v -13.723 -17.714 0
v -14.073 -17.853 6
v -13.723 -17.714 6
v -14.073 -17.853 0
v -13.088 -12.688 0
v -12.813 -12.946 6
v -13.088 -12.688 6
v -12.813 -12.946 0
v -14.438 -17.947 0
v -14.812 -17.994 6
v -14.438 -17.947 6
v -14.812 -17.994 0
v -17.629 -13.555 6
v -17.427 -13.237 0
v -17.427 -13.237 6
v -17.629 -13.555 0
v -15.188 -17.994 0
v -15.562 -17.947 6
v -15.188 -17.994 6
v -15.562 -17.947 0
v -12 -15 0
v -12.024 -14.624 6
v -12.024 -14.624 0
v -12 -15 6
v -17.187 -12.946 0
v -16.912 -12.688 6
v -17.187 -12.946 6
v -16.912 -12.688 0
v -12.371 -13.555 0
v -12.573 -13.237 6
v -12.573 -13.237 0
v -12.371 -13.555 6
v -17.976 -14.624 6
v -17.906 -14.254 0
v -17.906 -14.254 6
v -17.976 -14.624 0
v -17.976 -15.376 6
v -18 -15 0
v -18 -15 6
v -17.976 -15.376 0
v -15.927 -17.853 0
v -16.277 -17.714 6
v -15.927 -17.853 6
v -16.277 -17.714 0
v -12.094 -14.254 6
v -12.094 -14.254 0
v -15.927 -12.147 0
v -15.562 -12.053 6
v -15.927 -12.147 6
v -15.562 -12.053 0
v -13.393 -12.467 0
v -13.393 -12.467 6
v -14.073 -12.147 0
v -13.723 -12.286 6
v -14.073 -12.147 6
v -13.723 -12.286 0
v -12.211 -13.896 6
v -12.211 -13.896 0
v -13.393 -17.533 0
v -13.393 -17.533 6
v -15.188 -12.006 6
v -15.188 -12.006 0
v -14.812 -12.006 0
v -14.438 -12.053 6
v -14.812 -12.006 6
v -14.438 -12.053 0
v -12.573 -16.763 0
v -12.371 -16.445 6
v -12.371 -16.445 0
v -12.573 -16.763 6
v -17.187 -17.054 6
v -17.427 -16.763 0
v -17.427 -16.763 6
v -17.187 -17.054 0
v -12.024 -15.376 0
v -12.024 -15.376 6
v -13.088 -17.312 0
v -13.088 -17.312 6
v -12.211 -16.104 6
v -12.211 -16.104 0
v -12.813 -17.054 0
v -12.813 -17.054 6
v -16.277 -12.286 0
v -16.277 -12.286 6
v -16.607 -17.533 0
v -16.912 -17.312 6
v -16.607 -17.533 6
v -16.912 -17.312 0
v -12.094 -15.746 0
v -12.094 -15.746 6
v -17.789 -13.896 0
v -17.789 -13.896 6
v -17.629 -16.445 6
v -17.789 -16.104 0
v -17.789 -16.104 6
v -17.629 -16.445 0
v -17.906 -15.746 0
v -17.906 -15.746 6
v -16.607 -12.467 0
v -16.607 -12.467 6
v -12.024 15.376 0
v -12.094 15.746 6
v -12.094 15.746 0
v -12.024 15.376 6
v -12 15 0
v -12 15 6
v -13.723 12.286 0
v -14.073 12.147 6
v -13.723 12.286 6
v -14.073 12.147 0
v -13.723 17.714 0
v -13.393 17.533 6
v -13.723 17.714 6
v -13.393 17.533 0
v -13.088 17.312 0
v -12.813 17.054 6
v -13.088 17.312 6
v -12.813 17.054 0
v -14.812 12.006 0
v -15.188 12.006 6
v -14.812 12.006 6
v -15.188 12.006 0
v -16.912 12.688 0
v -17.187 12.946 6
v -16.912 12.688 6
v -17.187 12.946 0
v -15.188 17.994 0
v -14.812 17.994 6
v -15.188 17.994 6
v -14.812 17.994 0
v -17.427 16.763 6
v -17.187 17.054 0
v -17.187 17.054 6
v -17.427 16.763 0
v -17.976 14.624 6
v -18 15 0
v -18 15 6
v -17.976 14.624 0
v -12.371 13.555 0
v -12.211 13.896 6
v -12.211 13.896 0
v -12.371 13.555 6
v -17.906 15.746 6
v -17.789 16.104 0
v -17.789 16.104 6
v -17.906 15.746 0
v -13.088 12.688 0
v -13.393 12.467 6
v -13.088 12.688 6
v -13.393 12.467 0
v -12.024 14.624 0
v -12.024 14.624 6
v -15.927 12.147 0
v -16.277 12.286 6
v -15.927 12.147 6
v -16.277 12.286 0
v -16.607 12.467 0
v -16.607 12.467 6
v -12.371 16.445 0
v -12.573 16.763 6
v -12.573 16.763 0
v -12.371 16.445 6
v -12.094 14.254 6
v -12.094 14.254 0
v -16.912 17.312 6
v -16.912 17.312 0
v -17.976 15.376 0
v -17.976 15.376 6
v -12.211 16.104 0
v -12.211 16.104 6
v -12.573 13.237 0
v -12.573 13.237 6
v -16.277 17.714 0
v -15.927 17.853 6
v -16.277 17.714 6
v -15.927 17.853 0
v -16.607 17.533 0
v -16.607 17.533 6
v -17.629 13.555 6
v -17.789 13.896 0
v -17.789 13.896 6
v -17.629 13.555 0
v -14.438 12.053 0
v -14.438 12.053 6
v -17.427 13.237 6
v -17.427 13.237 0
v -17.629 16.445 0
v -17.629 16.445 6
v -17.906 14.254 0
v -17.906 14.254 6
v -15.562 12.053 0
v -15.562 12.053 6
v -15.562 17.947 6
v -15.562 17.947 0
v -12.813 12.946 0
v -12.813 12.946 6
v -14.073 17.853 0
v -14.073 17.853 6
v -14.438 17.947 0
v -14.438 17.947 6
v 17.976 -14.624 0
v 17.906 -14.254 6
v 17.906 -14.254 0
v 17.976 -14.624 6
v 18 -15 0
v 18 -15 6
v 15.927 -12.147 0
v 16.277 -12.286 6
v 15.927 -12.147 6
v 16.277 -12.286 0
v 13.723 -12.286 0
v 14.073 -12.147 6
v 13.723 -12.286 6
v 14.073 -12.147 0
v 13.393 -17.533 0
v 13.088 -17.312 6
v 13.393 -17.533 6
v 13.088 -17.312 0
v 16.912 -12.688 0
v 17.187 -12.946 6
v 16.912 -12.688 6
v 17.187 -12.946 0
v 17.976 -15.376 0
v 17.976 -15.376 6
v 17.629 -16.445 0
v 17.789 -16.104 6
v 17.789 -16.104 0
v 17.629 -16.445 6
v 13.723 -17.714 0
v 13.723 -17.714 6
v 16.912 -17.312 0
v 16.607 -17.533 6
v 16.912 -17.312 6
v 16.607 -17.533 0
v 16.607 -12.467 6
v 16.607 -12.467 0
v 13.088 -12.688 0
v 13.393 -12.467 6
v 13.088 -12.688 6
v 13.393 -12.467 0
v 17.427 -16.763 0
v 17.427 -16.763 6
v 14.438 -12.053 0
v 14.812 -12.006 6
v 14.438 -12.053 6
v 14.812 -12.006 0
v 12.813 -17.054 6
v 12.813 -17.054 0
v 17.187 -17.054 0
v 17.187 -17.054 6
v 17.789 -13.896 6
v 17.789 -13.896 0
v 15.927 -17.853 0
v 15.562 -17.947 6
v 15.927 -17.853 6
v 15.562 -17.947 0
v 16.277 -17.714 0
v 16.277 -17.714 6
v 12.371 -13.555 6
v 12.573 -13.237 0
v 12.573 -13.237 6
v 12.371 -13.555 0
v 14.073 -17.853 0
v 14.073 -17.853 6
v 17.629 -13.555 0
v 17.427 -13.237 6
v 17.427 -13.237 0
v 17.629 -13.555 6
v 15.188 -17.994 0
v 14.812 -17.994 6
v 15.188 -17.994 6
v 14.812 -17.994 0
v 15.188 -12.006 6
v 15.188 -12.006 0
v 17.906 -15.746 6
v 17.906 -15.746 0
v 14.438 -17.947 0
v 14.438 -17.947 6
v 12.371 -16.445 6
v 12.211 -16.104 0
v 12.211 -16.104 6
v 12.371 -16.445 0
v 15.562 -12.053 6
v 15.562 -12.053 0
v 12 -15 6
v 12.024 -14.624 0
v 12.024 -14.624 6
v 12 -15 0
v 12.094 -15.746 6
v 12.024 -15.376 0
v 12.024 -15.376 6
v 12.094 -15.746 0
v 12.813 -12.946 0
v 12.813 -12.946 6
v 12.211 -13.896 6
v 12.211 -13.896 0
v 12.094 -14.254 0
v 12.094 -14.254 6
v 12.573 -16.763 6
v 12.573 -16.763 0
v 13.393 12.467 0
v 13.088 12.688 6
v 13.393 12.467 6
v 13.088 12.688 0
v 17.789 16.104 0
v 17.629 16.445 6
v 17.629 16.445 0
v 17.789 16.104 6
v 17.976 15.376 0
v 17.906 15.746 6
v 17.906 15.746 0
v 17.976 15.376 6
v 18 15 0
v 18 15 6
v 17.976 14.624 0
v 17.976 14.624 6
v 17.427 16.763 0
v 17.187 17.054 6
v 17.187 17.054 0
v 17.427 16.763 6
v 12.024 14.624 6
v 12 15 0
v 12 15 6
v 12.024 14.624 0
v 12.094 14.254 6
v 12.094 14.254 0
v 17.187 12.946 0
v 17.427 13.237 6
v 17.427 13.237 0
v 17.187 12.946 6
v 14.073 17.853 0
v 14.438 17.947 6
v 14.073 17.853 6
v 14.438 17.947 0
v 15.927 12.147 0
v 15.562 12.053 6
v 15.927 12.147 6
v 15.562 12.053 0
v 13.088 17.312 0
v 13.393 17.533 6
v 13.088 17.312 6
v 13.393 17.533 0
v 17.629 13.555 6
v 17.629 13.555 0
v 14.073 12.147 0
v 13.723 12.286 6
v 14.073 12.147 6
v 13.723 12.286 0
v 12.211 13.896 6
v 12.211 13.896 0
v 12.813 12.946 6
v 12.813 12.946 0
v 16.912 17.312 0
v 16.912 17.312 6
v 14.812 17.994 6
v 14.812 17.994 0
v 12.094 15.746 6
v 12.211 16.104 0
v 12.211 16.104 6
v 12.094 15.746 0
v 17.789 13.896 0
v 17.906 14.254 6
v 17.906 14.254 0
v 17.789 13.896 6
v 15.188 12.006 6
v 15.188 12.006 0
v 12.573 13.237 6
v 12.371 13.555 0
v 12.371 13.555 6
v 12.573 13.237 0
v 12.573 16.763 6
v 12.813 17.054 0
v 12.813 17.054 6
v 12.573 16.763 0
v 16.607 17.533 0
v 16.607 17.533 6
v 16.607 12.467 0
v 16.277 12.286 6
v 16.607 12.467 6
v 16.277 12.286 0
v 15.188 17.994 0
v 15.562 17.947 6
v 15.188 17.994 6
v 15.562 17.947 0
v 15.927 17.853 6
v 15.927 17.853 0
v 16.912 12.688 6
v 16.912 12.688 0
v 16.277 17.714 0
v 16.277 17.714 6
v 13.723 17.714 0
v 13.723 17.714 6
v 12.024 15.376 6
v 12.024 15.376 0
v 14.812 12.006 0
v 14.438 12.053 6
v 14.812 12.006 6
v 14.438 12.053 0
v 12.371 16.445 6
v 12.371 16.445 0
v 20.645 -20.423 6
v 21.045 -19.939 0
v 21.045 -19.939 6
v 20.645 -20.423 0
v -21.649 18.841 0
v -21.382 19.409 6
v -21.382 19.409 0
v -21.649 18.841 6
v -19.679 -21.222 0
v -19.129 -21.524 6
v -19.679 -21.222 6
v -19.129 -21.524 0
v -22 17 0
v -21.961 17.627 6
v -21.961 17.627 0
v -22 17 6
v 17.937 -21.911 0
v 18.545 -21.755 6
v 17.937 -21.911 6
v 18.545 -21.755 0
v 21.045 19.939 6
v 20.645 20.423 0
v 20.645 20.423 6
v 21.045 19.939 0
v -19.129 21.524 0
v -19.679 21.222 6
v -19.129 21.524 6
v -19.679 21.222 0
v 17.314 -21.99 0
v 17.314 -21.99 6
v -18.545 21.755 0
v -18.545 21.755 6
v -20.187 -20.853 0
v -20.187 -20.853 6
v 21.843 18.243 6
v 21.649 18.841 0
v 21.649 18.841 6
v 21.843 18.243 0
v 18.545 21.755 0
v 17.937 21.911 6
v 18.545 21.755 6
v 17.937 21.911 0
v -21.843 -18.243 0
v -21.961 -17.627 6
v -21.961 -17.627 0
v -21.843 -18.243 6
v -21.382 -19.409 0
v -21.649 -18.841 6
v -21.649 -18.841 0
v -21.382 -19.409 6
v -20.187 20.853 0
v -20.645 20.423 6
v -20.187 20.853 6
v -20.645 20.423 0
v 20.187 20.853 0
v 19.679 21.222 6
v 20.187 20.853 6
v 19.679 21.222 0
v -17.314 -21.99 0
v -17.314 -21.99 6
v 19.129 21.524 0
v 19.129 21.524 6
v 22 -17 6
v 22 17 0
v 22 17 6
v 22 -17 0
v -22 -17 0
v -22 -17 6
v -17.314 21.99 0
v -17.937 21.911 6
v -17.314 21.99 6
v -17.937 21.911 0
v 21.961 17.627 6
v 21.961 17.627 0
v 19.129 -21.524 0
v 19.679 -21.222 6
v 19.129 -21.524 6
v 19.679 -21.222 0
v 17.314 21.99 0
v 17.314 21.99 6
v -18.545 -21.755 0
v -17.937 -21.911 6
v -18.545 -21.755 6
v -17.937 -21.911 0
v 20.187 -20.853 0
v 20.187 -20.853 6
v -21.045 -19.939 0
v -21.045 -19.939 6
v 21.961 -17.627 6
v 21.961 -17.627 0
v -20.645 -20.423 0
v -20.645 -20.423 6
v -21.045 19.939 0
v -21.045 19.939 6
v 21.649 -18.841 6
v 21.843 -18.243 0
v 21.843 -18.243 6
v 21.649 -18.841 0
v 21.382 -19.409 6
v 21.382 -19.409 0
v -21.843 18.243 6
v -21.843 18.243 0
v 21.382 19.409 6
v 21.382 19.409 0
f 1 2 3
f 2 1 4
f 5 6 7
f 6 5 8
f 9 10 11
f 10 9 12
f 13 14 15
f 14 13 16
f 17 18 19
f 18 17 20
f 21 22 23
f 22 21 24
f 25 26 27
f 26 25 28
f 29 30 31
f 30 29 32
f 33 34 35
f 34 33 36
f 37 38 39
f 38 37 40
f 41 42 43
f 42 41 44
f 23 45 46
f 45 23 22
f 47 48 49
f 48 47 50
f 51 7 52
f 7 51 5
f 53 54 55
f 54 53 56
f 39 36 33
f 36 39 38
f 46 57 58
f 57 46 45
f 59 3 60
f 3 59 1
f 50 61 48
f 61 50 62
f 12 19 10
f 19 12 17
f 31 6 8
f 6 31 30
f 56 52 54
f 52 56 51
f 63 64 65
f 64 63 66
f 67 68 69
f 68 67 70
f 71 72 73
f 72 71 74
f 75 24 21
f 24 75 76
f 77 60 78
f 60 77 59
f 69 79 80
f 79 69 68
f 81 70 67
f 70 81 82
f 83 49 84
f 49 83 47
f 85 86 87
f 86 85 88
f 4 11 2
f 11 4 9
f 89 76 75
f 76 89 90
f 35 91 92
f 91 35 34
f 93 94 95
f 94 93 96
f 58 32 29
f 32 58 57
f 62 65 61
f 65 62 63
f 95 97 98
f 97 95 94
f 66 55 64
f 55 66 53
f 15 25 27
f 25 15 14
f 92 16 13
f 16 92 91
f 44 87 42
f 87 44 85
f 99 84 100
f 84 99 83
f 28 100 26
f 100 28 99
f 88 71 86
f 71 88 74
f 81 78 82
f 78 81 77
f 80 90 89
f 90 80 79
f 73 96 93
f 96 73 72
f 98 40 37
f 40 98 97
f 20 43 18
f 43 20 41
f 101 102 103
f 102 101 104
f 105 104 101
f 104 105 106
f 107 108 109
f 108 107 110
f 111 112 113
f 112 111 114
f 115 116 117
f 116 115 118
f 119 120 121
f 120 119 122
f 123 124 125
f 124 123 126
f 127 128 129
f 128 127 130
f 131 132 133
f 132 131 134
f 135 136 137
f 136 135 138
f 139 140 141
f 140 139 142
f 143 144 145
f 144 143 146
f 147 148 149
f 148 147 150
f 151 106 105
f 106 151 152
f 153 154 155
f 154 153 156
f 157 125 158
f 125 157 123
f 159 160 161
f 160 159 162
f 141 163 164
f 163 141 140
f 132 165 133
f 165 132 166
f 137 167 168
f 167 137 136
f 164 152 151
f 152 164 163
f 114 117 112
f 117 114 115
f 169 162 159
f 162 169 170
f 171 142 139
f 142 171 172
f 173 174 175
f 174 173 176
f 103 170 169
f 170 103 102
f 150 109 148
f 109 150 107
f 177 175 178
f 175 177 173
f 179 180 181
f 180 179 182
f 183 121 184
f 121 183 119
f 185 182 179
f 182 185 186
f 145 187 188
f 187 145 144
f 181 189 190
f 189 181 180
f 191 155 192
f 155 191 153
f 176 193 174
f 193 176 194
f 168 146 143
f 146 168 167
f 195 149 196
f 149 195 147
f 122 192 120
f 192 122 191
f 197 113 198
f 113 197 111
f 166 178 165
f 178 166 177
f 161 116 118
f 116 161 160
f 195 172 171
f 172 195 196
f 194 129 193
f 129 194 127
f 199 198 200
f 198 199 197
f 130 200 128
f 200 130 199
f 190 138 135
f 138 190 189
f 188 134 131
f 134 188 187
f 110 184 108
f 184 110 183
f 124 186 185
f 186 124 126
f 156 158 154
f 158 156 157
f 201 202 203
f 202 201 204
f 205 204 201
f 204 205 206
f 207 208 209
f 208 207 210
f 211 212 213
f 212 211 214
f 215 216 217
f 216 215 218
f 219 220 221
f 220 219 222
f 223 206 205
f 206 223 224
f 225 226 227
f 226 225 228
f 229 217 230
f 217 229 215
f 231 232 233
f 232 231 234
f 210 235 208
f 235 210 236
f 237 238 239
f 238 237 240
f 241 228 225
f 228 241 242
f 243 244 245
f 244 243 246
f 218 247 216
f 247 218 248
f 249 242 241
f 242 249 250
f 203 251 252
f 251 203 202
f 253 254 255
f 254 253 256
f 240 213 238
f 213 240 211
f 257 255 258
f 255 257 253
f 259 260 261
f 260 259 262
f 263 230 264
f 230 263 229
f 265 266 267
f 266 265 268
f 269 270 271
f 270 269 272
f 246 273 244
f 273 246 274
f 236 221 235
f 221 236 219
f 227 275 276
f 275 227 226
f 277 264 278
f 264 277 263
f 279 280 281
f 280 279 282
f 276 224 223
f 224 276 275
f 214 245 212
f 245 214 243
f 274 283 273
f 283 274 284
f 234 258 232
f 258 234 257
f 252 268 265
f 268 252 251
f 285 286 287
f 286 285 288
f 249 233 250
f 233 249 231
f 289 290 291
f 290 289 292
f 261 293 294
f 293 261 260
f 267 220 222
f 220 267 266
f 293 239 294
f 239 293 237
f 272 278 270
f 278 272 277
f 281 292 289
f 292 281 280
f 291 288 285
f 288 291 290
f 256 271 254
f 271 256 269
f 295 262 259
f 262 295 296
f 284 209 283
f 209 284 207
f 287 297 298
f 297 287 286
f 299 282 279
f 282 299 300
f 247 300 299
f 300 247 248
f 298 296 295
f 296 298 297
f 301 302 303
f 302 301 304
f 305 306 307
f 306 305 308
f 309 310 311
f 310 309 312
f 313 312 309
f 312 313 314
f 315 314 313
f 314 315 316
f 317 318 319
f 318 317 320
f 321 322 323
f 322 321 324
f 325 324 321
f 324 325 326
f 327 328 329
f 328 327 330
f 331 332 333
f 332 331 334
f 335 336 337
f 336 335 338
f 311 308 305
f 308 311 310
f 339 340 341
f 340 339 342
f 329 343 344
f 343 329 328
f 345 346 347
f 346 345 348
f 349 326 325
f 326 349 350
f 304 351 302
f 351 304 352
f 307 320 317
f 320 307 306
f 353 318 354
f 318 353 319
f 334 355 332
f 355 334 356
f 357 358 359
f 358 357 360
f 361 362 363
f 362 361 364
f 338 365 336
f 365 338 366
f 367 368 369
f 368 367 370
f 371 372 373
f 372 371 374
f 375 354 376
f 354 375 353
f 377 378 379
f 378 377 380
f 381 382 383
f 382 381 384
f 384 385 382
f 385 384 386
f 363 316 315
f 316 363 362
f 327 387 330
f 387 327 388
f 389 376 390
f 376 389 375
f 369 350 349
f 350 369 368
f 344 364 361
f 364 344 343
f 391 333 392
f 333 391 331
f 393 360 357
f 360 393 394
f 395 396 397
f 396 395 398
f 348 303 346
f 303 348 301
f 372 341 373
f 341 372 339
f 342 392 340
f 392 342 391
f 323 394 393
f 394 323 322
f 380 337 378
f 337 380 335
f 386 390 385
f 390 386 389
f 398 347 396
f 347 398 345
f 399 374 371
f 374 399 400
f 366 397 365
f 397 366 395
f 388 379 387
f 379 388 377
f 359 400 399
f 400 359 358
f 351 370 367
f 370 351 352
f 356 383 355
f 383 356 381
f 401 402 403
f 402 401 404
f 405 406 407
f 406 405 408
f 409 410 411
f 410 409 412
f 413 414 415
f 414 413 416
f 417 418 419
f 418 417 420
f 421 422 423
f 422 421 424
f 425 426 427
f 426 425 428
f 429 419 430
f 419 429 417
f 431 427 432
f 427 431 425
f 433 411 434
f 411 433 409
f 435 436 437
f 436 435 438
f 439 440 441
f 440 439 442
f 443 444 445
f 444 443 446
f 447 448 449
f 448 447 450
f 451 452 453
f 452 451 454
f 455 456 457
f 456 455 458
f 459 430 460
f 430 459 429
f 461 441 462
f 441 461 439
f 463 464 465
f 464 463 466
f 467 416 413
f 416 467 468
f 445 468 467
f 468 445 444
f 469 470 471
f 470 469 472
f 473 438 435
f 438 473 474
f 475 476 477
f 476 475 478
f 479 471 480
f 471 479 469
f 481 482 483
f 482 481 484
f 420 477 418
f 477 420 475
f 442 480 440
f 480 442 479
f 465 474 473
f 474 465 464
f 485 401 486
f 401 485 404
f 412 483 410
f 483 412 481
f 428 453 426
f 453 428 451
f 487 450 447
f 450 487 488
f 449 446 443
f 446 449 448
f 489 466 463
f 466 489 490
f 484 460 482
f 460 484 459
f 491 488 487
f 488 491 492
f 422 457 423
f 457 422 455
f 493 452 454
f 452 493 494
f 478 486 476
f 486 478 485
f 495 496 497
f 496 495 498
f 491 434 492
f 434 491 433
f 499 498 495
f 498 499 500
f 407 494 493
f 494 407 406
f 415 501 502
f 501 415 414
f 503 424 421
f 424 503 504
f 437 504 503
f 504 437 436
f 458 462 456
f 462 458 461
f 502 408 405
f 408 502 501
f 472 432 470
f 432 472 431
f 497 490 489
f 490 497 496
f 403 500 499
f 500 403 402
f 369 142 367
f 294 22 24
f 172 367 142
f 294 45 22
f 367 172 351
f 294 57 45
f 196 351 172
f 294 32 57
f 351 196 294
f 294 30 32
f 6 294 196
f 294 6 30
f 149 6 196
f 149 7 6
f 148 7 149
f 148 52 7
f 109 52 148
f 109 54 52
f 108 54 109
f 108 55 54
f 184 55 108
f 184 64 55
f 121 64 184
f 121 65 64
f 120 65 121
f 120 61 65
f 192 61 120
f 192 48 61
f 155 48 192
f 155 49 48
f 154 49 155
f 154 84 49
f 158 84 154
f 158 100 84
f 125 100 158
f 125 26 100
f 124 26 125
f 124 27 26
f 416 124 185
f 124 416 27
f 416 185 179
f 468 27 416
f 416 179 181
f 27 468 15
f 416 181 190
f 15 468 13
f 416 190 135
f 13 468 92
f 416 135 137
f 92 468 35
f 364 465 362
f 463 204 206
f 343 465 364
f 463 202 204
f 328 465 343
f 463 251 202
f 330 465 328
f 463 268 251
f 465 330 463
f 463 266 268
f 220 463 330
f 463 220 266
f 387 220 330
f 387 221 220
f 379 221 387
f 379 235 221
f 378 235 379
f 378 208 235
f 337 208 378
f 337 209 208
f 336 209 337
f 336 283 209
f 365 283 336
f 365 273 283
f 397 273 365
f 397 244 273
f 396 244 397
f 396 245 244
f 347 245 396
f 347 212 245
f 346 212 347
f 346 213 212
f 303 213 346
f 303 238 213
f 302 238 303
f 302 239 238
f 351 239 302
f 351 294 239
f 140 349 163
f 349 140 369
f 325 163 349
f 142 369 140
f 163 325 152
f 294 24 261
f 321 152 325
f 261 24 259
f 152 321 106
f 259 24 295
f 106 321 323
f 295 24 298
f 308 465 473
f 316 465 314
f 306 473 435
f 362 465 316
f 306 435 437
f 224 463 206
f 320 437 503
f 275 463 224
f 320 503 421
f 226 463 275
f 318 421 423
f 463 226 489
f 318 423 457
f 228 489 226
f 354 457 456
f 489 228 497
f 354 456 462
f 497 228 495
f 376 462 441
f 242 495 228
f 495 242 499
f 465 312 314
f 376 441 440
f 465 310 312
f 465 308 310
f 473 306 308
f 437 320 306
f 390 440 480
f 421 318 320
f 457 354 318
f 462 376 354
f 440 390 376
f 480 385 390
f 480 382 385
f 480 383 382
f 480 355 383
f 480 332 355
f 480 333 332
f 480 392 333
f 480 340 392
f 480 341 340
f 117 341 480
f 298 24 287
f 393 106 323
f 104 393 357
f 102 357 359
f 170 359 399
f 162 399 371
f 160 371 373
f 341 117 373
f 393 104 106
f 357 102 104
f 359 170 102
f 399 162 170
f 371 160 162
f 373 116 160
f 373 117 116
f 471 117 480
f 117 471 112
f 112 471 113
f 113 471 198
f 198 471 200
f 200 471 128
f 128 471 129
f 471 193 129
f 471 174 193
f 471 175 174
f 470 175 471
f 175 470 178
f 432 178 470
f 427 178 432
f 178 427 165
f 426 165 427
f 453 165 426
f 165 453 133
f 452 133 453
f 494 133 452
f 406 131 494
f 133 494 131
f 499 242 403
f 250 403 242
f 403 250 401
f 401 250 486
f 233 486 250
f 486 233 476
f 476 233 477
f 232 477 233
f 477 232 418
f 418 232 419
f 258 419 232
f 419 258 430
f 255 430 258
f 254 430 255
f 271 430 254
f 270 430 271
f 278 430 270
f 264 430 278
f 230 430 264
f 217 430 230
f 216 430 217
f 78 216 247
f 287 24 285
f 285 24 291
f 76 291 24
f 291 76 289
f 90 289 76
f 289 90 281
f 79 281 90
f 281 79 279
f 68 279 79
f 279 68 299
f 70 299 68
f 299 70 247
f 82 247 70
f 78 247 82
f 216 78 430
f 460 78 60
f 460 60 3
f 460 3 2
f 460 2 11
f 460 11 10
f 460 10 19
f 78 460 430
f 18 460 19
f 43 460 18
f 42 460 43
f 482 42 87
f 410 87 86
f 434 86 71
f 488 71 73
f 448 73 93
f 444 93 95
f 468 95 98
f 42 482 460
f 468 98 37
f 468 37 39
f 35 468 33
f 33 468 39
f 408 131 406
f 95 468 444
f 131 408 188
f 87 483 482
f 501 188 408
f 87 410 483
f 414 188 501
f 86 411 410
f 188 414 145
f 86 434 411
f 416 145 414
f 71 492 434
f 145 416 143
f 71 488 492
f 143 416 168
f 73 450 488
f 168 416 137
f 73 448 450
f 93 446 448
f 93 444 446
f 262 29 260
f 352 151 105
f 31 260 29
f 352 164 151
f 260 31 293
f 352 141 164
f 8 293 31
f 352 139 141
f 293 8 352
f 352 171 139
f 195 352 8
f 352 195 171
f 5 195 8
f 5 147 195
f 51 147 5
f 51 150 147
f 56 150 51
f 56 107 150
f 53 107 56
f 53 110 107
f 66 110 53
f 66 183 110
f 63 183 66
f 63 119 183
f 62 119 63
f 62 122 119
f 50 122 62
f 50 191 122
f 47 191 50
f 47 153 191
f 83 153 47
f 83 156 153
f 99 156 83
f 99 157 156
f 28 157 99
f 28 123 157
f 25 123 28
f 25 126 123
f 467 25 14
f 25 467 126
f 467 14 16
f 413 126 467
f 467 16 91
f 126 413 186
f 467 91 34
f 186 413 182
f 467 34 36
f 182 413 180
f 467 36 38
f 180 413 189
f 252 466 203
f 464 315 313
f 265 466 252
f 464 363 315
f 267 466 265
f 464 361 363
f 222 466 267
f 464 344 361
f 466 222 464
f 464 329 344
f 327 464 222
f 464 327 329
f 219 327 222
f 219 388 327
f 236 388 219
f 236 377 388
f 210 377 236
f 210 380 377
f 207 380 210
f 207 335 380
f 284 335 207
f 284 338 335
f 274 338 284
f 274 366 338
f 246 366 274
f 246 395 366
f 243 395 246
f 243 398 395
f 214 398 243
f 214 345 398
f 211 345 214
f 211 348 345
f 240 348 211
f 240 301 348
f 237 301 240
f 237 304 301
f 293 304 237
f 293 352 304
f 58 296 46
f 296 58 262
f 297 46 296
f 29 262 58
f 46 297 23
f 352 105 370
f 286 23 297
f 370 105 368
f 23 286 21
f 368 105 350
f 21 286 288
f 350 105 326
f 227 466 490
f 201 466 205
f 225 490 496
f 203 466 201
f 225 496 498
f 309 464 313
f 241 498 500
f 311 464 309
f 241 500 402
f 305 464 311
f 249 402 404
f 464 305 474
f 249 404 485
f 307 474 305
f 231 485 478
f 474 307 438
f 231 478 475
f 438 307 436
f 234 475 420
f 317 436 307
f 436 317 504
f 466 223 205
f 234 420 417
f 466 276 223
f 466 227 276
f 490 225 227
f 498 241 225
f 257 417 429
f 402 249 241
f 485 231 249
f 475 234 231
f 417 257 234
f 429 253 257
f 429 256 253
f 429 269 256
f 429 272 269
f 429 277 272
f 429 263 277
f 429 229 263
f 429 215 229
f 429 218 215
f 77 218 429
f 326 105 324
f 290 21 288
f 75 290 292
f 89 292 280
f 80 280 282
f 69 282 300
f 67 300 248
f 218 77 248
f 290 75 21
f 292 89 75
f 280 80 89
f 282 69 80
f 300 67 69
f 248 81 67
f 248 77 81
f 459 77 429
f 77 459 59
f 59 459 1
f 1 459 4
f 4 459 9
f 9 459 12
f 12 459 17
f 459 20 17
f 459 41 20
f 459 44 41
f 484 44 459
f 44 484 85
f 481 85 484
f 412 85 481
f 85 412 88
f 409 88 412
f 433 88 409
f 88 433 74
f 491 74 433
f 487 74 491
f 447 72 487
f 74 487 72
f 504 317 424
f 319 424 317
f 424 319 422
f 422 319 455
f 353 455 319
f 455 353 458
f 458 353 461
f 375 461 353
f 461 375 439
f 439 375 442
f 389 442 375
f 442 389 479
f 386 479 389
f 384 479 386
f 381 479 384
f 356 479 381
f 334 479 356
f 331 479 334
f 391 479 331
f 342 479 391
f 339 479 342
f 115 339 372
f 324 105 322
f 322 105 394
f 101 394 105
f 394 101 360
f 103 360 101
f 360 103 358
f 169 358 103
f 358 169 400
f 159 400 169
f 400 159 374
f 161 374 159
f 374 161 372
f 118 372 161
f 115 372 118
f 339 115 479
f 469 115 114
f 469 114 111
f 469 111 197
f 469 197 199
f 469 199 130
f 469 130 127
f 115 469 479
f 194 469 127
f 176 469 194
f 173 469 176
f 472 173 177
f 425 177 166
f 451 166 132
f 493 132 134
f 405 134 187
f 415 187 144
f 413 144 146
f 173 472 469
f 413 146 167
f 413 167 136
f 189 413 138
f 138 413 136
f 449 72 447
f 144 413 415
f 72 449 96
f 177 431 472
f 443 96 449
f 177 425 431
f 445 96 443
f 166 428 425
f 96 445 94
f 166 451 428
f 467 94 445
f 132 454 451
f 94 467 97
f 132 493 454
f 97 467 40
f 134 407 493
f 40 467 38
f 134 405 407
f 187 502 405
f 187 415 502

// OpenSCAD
$fn = 50;


difference() {
	union() {
		hull() {
			translate(v = [-17.0000000000, 17.0000000000, 0]) {
				cylinder(h = 6, r = 5);
			}
			translate(v = [17.0000000000, 17.0000000000, 0]) {
				cylinder(h = 6, r = 5);
			}
			translate(v = [-17.0000000000, -17.0000000000, 0]) {
				cylinder(h = 6, r = 5);
			}
			translate(v = [17.0000000000, -17.0000000000, 0]) {
				cylinder(h = 6, r = 5);
			}
		}
	}
	union() {
		translate(v = [-15.0000000000, -15.0000000000, -100.0000000000]) {
			cylinder(h = 200, r = 3.0000000000);
		}
		translate(v = [-15.0000000000, 15.0000000000, -100.0000000000]) {
			cylinder(h = 200, r = 3.0000000000);
		}
		translate(v = [15.0000000000, -15.0000000000, -100.0000000000]) {
			cylinder(h = 200, r = 3.0000000000);
		}
		translate(v = [15.0000000000, 15.0000000000, -100.0000000000]) {
			cylinder(h = 200, r = 3.0000000000);
		}
	}
}
